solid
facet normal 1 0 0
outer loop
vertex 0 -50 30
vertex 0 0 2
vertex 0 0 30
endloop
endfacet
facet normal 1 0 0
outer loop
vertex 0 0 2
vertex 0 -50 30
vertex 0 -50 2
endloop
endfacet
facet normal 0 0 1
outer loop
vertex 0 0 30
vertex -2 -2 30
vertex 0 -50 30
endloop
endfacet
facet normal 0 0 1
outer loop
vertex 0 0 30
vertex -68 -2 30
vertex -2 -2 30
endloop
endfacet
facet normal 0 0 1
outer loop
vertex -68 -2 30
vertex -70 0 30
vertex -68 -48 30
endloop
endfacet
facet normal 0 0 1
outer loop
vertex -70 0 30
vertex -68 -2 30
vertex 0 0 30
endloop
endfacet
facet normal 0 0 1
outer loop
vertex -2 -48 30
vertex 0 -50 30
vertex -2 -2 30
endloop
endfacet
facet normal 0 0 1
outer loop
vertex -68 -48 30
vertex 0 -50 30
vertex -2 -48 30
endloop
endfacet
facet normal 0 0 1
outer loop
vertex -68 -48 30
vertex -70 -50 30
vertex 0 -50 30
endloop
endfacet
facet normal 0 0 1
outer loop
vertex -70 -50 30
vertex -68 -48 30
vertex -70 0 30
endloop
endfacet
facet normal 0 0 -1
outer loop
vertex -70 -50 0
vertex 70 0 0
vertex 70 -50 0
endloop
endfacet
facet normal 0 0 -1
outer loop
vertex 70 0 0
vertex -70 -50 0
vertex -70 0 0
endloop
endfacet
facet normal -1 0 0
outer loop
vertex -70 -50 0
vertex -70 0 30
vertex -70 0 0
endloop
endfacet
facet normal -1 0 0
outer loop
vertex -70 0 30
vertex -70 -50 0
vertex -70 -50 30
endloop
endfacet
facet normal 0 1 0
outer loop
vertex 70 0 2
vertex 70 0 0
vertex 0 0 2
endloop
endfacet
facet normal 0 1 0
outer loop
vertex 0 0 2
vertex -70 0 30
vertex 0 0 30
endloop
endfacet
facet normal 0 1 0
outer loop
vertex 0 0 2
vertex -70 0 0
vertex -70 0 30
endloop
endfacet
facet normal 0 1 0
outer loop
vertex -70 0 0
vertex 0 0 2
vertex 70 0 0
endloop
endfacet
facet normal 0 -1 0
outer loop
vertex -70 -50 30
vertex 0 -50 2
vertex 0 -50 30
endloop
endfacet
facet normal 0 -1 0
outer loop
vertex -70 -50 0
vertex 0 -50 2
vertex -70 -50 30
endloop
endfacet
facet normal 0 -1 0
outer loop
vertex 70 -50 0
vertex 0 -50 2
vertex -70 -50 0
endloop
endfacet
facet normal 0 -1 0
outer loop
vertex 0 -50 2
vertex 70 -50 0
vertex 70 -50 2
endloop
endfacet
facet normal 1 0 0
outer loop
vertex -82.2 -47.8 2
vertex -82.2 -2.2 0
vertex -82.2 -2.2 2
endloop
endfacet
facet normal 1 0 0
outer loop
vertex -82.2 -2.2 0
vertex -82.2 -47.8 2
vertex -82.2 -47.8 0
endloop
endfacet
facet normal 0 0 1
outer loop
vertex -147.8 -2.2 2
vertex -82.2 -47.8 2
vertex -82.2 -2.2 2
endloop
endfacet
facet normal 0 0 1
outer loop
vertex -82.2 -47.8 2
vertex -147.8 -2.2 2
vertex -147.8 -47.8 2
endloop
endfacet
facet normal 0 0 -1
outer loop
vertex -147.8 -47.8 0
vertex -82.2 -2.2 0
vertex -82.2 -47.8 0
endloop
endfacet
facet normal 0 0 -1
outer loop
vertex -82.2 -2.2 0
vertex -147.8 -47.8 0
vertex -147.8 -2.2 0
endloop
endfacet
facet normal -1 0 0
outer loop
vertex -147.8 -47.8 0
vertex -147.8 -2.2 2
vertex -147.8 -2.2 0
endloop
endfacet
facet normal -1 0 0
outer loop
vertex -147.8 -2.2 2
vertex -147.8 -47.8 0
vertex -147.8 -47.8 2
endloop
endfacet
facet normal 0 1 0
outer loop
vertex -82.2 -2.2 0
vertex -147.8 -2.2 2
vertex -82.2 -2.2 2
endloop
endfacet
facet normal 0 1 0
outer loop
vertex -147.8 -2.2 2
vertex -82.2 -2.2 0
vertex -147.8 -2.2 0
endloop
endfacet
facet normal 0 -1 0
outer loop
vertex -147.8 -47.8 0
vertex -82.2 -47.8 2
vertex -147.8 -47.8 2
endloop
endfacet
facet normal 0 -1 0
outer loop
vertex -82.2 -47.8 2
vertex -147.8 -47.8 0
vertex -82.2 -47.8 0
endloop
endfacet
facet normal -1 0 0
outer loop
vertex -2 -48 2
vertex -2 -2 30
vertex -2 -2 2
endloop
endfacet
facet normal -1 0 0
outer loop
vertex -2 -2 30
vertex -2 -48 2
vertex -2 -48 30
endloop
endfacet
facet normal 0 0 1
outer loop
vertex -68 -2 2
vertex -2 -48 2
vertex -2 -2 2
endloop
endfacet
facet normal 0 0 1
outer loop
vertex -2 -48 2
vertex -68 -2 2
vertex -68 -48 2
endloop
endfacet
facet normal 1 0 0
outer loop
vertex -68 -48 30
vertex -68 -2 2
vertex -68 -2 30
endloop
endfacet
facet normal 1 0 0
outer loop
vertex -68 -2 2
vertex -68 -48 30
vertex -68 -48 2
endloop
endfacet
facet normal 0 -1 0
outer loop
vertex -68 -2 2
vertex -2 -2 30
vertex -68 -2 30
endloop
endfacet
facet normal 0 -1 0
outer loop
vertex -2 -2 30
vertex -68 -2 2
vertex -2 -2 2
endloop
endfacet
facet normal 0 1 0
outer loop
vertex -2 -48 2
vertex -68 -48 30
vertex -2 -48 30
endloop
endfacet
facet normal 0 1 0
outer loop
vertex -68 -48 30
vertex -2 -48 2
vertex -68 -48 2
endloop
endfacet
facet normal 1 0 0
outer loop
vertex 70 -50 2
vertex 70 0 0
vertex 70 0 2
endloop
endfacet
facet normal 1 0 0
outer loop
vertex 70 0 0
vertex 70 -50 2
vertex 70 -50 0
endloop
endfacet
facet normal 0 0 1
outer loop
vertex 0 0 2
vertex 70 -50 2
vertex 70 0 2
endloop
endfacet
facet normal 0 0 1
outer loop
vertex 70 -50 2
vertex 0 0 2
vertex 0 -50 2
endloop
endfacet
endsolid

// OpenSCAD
// Built by bench/smallmodels/features/compiler.py from a list of features.
$fn = 64;
difference() {
  union() {
    translate([-35, -25, 0]) translate([-35, -25, 0]) cube([70, 50, 30]);
    translate([-115, -25, 0]) translate([-32.8, -22.8, 0]) cube([65.6, 45.6, 2]);
  }
  translate([-68, -48, 2]) cube([66, 46, 29]);  // shell, wall 2, open top
}
union() {
    translate([35, -25, 0]) translate([-35, -25, 0]) cube([70, 50, 2]);
  }
